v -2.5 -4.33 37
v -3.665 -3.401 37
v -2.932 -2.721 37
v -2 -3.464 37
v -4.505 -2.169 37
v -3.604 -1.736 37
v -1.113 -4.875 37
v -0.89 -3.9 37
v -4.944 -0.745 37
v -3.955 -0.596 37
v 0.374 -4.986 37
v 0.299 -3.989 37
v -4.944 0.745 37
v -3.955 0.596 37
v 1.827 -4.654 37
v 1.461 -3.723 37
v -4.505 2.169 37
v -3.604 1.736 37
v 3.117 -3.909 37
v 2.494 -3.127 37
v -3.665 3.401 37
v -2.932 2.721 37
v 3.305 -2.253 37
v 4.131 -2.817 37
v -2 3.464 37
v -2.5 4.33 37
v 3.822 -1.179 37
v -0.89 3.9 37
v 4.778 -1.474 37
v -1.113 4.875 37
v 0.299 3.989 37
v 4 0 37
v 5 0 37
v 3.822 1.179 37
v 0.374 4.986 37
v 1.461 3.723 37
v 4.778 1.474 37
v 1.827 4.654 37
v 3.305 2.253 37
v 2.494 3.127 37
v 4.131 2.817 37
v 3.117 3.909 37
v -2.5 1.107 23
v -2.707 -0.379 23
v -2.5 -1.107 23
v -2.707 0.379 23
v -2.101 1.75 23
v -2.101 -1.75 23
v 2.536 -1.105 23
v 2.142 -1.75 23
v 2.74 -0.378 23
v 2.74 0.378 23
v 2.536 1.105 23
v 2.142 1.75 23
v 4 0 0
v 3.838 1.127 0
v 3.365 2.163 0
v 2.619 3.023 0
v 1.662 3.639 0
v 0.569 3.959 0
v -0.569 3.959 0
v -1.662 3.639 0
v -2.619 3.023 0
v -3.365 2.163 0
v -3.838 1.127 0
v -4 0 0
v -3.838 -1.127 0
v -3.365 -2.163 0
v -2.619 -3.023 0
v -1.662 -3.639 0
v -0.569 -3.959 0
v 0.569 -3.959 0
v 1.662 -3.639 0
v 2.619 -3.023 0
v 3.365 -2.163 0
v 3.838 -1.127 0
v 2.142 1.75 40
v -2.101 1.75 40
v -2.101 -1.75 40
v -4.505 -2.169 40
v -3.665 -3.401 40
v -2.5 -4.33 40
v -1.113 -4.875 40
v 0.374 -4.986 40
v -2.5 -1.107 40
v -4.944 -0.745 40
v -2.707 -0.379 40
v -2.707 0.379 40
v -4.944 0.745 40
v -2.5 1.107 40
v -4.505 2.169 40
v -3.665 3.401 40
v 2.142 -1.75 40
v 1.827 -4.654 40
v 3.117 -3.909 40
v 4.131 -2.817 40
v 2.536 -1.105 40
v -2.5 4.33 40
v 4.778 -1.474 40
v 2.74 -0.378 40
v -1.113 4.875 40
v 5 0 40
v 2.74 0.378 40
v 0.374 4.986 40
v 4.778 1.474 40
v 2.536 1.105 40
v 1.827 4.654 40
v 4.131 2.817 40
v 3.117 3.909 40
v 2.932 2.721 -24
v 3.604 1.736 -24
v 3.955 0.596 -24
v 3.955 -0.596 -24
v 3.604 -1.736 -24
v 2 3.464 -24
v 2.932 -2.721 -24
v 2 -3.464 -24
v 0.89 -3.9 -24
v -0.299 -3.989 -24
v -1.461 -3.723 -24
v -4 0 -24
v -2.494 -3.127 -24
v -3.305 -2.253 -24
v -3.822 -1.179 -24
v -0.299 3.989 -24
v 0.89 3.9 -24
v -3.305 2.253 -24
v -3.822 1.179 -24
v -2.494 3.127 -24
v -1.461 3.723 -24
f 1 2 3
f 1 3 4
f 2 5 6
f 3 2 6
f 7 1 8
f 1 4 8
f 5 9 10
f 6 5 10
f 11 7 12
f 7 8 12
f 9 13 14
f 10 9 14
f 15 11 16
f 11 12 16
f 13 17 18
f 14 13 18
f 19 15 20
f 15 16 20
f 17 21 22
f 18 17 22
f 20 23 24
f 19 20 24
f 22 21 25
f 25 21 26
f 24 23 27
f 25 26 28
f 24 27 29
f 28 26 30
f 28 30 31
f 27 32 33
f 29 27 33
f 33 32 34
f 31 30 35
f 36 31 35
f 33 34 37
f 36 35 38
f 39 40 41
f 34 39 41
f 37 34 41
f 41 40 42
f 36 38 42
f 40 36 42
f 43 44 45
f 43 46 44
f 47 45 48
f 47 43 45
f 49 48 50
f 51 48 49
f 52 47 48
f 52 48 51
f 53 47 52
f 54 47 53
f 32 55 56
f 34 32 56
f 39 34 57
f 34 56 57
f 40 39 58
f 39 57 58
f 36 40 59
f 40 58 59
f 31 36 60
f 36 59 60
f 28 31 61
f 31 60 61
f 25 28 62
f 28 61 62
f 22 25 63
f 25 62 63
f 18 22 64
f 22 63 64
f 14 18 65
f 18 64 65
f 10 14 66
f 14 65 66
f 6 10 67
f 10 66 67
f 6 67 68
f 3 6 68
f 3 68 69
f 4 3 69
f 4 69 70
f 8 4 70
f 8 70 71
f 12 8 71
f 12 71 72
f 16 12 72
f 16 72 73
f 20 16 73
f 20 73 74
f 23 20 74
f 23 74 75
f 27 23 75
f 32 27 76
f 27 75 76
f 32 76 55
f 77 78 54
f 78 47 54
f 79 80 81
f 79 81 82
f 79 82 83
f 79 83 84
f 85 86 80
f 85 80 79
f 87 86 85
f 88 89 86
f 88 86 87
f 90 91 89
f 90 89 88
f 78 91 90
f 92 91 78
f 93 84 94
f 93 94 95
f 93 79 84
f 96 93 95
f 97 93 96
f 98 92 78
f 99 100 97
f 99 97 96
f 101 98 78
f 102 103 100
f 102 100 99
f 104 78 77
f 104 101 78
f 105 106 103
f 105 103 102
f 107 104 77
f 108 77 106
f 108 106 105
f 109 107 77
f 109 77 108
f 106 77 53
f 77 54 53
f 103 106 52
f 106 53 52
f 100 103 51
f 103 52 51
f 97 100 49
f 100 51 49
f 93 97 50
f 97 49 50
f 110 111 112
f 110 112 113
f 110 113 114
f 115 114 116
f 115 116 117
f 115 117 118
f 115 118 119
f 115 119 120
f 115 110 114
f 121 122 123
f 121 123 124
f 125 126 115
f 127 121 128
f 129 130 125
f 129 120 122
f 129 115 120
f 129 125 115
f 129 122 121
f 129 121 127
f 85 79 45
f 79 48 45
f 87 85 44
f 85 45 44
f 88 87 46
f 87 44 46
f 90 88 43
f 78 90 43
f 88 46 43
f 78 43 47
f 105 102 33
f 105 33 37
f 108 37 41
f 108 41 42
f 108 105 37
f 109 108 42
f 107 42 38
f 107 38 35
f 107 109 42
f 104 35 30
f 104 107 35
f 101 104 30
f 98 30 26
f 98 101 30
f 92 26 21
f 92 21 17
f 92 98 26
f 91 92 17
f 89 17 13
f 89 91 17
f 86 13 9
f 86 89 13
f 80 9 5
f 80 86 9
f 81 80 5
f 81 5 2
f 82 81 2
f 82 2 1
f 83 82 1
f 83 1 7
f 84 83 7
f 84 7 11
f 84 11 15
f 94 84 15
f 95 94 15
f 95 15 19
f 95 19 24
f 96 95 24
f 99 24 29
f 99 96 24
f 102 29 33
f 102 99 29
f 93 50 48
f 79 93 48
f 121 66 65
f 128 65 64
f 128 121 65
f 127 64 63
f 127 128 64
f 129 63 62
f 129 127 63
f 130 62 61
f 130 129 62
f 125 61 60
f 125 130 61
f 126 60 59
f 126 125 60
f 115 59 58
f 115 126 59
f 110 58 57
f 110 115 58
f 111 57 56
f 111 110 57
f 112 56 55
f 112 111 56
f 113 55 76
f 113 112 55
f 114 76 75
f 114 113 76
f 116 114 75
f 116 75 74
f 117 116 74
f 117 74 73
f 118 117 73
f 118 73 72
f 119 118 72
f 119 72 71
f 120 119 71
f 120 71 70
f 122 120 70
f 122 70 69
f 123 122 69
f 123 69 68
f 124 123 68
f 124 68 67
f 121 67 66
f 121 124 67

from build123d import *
from build123d.topology import SkipClean

# Parameters (mm, degrees)
SKETCH1_R               = 4
BOSS_EXTRUDE1_DEPTH     = 40
SKETCH2_R               = 5
BOSS_EXTRUDE2_DEPTH     = 3
CUT_EXTRUDE1_DEPTH      = 43
CUT_EXTRUDE1_DEPTH_BACK = 3
SKETCH1_3_R             = 4
BOSS_EXTRUDE3_DEPTH     = 23
BOSS_EXTRUDE4_START     = 24
SKETCH3_R               = 4
BOSS_EXTRUDE4_DEPTH     = 24


with BuildPart() as part:
    # Sketch1 → Boss-Extrude1 (new body)
    with BuildSketch(Plane.XY):
        Circle(SKETCH1_R)
        with BuildLine():
            Line((-2.100590034, 1.75), (2.142050653, 1.75))
            ThreePointArc((2.142050653, 1.75), (2.766022596, 0), (2.142050653, -1.75))
            Line((2.142050653, -1.75), (-2.100590034, -1.75))
            ThreePointArc((-2.100590034, -1.75), (-2.733195007, 0), (-2.100590034, 1.75))
        make_face(mode=Mode.SUBTRACT)
    extrude(amount=BOSS_EXTRUDE1_DEPTH)

    # Sketch2 → Boss-Extrude2 (add)
    with BuildSketch(Plane.XY.offset(40)):
        Circle(SKETCH2_R)
    extrude(amount=-BOSS_EXTRUDE2_DEPTH)

    # Sketch1<2> → Cut-Extrude1 (cut, two sides: drawn at the far end of the back side and taken through both)
    with SkipClean():  # the faces are left unmerged after this step: merging them gives an invalid solid
        with BuildSketch(Plane.XY.offset(-CUT_EXTRUDE1_DEPTH_BACK)):
            with BuildLine():
                Line((2.142050653, 1.75), (-2.100590034, 1.75))
                ThreePointArc((-2.100590034, 1.75), (-2.733195007, 0), (-2.100590034, -1.75))
                Line((-2.100590034, -1.75), (2.142050653, -1.75))
                ThreePointArc((2.142050653, -1.75), (2.766022596, 0), (2.142050653, 1.75))
            make_face()
        extrude(amount=CUT_EXTRUDE1_DEPTH + CUT_EXTRUDE1_DEPTH_BACK, mode=Mode.SUBTRACT)
    add(part.part.scale(1), mode=Mode.REPLACE)  # the faces are merged on a copy

    # Sketch1<3> → Boss-Extrude3 (add)
    with BuildSketch(Plane.XY):
        Circle(SKETCH1_3_R)
    extrude(amount=BOSS_EXTRUDE3_DEPTH)

    # Sketch3 → Boss-Extrude4 (add)
    with BuildSketch(Plane(origin=(0, 0, 0), x_dir=(-1, 0, 0), z_dir=(0, 0, -1)).offset(BOSS_EXTRUDE4_START)):
        Circle(SKETCH3_R)
    extrude(amount=-BOSS_EXTRUDE4_DEPTH)


solid = part.part
